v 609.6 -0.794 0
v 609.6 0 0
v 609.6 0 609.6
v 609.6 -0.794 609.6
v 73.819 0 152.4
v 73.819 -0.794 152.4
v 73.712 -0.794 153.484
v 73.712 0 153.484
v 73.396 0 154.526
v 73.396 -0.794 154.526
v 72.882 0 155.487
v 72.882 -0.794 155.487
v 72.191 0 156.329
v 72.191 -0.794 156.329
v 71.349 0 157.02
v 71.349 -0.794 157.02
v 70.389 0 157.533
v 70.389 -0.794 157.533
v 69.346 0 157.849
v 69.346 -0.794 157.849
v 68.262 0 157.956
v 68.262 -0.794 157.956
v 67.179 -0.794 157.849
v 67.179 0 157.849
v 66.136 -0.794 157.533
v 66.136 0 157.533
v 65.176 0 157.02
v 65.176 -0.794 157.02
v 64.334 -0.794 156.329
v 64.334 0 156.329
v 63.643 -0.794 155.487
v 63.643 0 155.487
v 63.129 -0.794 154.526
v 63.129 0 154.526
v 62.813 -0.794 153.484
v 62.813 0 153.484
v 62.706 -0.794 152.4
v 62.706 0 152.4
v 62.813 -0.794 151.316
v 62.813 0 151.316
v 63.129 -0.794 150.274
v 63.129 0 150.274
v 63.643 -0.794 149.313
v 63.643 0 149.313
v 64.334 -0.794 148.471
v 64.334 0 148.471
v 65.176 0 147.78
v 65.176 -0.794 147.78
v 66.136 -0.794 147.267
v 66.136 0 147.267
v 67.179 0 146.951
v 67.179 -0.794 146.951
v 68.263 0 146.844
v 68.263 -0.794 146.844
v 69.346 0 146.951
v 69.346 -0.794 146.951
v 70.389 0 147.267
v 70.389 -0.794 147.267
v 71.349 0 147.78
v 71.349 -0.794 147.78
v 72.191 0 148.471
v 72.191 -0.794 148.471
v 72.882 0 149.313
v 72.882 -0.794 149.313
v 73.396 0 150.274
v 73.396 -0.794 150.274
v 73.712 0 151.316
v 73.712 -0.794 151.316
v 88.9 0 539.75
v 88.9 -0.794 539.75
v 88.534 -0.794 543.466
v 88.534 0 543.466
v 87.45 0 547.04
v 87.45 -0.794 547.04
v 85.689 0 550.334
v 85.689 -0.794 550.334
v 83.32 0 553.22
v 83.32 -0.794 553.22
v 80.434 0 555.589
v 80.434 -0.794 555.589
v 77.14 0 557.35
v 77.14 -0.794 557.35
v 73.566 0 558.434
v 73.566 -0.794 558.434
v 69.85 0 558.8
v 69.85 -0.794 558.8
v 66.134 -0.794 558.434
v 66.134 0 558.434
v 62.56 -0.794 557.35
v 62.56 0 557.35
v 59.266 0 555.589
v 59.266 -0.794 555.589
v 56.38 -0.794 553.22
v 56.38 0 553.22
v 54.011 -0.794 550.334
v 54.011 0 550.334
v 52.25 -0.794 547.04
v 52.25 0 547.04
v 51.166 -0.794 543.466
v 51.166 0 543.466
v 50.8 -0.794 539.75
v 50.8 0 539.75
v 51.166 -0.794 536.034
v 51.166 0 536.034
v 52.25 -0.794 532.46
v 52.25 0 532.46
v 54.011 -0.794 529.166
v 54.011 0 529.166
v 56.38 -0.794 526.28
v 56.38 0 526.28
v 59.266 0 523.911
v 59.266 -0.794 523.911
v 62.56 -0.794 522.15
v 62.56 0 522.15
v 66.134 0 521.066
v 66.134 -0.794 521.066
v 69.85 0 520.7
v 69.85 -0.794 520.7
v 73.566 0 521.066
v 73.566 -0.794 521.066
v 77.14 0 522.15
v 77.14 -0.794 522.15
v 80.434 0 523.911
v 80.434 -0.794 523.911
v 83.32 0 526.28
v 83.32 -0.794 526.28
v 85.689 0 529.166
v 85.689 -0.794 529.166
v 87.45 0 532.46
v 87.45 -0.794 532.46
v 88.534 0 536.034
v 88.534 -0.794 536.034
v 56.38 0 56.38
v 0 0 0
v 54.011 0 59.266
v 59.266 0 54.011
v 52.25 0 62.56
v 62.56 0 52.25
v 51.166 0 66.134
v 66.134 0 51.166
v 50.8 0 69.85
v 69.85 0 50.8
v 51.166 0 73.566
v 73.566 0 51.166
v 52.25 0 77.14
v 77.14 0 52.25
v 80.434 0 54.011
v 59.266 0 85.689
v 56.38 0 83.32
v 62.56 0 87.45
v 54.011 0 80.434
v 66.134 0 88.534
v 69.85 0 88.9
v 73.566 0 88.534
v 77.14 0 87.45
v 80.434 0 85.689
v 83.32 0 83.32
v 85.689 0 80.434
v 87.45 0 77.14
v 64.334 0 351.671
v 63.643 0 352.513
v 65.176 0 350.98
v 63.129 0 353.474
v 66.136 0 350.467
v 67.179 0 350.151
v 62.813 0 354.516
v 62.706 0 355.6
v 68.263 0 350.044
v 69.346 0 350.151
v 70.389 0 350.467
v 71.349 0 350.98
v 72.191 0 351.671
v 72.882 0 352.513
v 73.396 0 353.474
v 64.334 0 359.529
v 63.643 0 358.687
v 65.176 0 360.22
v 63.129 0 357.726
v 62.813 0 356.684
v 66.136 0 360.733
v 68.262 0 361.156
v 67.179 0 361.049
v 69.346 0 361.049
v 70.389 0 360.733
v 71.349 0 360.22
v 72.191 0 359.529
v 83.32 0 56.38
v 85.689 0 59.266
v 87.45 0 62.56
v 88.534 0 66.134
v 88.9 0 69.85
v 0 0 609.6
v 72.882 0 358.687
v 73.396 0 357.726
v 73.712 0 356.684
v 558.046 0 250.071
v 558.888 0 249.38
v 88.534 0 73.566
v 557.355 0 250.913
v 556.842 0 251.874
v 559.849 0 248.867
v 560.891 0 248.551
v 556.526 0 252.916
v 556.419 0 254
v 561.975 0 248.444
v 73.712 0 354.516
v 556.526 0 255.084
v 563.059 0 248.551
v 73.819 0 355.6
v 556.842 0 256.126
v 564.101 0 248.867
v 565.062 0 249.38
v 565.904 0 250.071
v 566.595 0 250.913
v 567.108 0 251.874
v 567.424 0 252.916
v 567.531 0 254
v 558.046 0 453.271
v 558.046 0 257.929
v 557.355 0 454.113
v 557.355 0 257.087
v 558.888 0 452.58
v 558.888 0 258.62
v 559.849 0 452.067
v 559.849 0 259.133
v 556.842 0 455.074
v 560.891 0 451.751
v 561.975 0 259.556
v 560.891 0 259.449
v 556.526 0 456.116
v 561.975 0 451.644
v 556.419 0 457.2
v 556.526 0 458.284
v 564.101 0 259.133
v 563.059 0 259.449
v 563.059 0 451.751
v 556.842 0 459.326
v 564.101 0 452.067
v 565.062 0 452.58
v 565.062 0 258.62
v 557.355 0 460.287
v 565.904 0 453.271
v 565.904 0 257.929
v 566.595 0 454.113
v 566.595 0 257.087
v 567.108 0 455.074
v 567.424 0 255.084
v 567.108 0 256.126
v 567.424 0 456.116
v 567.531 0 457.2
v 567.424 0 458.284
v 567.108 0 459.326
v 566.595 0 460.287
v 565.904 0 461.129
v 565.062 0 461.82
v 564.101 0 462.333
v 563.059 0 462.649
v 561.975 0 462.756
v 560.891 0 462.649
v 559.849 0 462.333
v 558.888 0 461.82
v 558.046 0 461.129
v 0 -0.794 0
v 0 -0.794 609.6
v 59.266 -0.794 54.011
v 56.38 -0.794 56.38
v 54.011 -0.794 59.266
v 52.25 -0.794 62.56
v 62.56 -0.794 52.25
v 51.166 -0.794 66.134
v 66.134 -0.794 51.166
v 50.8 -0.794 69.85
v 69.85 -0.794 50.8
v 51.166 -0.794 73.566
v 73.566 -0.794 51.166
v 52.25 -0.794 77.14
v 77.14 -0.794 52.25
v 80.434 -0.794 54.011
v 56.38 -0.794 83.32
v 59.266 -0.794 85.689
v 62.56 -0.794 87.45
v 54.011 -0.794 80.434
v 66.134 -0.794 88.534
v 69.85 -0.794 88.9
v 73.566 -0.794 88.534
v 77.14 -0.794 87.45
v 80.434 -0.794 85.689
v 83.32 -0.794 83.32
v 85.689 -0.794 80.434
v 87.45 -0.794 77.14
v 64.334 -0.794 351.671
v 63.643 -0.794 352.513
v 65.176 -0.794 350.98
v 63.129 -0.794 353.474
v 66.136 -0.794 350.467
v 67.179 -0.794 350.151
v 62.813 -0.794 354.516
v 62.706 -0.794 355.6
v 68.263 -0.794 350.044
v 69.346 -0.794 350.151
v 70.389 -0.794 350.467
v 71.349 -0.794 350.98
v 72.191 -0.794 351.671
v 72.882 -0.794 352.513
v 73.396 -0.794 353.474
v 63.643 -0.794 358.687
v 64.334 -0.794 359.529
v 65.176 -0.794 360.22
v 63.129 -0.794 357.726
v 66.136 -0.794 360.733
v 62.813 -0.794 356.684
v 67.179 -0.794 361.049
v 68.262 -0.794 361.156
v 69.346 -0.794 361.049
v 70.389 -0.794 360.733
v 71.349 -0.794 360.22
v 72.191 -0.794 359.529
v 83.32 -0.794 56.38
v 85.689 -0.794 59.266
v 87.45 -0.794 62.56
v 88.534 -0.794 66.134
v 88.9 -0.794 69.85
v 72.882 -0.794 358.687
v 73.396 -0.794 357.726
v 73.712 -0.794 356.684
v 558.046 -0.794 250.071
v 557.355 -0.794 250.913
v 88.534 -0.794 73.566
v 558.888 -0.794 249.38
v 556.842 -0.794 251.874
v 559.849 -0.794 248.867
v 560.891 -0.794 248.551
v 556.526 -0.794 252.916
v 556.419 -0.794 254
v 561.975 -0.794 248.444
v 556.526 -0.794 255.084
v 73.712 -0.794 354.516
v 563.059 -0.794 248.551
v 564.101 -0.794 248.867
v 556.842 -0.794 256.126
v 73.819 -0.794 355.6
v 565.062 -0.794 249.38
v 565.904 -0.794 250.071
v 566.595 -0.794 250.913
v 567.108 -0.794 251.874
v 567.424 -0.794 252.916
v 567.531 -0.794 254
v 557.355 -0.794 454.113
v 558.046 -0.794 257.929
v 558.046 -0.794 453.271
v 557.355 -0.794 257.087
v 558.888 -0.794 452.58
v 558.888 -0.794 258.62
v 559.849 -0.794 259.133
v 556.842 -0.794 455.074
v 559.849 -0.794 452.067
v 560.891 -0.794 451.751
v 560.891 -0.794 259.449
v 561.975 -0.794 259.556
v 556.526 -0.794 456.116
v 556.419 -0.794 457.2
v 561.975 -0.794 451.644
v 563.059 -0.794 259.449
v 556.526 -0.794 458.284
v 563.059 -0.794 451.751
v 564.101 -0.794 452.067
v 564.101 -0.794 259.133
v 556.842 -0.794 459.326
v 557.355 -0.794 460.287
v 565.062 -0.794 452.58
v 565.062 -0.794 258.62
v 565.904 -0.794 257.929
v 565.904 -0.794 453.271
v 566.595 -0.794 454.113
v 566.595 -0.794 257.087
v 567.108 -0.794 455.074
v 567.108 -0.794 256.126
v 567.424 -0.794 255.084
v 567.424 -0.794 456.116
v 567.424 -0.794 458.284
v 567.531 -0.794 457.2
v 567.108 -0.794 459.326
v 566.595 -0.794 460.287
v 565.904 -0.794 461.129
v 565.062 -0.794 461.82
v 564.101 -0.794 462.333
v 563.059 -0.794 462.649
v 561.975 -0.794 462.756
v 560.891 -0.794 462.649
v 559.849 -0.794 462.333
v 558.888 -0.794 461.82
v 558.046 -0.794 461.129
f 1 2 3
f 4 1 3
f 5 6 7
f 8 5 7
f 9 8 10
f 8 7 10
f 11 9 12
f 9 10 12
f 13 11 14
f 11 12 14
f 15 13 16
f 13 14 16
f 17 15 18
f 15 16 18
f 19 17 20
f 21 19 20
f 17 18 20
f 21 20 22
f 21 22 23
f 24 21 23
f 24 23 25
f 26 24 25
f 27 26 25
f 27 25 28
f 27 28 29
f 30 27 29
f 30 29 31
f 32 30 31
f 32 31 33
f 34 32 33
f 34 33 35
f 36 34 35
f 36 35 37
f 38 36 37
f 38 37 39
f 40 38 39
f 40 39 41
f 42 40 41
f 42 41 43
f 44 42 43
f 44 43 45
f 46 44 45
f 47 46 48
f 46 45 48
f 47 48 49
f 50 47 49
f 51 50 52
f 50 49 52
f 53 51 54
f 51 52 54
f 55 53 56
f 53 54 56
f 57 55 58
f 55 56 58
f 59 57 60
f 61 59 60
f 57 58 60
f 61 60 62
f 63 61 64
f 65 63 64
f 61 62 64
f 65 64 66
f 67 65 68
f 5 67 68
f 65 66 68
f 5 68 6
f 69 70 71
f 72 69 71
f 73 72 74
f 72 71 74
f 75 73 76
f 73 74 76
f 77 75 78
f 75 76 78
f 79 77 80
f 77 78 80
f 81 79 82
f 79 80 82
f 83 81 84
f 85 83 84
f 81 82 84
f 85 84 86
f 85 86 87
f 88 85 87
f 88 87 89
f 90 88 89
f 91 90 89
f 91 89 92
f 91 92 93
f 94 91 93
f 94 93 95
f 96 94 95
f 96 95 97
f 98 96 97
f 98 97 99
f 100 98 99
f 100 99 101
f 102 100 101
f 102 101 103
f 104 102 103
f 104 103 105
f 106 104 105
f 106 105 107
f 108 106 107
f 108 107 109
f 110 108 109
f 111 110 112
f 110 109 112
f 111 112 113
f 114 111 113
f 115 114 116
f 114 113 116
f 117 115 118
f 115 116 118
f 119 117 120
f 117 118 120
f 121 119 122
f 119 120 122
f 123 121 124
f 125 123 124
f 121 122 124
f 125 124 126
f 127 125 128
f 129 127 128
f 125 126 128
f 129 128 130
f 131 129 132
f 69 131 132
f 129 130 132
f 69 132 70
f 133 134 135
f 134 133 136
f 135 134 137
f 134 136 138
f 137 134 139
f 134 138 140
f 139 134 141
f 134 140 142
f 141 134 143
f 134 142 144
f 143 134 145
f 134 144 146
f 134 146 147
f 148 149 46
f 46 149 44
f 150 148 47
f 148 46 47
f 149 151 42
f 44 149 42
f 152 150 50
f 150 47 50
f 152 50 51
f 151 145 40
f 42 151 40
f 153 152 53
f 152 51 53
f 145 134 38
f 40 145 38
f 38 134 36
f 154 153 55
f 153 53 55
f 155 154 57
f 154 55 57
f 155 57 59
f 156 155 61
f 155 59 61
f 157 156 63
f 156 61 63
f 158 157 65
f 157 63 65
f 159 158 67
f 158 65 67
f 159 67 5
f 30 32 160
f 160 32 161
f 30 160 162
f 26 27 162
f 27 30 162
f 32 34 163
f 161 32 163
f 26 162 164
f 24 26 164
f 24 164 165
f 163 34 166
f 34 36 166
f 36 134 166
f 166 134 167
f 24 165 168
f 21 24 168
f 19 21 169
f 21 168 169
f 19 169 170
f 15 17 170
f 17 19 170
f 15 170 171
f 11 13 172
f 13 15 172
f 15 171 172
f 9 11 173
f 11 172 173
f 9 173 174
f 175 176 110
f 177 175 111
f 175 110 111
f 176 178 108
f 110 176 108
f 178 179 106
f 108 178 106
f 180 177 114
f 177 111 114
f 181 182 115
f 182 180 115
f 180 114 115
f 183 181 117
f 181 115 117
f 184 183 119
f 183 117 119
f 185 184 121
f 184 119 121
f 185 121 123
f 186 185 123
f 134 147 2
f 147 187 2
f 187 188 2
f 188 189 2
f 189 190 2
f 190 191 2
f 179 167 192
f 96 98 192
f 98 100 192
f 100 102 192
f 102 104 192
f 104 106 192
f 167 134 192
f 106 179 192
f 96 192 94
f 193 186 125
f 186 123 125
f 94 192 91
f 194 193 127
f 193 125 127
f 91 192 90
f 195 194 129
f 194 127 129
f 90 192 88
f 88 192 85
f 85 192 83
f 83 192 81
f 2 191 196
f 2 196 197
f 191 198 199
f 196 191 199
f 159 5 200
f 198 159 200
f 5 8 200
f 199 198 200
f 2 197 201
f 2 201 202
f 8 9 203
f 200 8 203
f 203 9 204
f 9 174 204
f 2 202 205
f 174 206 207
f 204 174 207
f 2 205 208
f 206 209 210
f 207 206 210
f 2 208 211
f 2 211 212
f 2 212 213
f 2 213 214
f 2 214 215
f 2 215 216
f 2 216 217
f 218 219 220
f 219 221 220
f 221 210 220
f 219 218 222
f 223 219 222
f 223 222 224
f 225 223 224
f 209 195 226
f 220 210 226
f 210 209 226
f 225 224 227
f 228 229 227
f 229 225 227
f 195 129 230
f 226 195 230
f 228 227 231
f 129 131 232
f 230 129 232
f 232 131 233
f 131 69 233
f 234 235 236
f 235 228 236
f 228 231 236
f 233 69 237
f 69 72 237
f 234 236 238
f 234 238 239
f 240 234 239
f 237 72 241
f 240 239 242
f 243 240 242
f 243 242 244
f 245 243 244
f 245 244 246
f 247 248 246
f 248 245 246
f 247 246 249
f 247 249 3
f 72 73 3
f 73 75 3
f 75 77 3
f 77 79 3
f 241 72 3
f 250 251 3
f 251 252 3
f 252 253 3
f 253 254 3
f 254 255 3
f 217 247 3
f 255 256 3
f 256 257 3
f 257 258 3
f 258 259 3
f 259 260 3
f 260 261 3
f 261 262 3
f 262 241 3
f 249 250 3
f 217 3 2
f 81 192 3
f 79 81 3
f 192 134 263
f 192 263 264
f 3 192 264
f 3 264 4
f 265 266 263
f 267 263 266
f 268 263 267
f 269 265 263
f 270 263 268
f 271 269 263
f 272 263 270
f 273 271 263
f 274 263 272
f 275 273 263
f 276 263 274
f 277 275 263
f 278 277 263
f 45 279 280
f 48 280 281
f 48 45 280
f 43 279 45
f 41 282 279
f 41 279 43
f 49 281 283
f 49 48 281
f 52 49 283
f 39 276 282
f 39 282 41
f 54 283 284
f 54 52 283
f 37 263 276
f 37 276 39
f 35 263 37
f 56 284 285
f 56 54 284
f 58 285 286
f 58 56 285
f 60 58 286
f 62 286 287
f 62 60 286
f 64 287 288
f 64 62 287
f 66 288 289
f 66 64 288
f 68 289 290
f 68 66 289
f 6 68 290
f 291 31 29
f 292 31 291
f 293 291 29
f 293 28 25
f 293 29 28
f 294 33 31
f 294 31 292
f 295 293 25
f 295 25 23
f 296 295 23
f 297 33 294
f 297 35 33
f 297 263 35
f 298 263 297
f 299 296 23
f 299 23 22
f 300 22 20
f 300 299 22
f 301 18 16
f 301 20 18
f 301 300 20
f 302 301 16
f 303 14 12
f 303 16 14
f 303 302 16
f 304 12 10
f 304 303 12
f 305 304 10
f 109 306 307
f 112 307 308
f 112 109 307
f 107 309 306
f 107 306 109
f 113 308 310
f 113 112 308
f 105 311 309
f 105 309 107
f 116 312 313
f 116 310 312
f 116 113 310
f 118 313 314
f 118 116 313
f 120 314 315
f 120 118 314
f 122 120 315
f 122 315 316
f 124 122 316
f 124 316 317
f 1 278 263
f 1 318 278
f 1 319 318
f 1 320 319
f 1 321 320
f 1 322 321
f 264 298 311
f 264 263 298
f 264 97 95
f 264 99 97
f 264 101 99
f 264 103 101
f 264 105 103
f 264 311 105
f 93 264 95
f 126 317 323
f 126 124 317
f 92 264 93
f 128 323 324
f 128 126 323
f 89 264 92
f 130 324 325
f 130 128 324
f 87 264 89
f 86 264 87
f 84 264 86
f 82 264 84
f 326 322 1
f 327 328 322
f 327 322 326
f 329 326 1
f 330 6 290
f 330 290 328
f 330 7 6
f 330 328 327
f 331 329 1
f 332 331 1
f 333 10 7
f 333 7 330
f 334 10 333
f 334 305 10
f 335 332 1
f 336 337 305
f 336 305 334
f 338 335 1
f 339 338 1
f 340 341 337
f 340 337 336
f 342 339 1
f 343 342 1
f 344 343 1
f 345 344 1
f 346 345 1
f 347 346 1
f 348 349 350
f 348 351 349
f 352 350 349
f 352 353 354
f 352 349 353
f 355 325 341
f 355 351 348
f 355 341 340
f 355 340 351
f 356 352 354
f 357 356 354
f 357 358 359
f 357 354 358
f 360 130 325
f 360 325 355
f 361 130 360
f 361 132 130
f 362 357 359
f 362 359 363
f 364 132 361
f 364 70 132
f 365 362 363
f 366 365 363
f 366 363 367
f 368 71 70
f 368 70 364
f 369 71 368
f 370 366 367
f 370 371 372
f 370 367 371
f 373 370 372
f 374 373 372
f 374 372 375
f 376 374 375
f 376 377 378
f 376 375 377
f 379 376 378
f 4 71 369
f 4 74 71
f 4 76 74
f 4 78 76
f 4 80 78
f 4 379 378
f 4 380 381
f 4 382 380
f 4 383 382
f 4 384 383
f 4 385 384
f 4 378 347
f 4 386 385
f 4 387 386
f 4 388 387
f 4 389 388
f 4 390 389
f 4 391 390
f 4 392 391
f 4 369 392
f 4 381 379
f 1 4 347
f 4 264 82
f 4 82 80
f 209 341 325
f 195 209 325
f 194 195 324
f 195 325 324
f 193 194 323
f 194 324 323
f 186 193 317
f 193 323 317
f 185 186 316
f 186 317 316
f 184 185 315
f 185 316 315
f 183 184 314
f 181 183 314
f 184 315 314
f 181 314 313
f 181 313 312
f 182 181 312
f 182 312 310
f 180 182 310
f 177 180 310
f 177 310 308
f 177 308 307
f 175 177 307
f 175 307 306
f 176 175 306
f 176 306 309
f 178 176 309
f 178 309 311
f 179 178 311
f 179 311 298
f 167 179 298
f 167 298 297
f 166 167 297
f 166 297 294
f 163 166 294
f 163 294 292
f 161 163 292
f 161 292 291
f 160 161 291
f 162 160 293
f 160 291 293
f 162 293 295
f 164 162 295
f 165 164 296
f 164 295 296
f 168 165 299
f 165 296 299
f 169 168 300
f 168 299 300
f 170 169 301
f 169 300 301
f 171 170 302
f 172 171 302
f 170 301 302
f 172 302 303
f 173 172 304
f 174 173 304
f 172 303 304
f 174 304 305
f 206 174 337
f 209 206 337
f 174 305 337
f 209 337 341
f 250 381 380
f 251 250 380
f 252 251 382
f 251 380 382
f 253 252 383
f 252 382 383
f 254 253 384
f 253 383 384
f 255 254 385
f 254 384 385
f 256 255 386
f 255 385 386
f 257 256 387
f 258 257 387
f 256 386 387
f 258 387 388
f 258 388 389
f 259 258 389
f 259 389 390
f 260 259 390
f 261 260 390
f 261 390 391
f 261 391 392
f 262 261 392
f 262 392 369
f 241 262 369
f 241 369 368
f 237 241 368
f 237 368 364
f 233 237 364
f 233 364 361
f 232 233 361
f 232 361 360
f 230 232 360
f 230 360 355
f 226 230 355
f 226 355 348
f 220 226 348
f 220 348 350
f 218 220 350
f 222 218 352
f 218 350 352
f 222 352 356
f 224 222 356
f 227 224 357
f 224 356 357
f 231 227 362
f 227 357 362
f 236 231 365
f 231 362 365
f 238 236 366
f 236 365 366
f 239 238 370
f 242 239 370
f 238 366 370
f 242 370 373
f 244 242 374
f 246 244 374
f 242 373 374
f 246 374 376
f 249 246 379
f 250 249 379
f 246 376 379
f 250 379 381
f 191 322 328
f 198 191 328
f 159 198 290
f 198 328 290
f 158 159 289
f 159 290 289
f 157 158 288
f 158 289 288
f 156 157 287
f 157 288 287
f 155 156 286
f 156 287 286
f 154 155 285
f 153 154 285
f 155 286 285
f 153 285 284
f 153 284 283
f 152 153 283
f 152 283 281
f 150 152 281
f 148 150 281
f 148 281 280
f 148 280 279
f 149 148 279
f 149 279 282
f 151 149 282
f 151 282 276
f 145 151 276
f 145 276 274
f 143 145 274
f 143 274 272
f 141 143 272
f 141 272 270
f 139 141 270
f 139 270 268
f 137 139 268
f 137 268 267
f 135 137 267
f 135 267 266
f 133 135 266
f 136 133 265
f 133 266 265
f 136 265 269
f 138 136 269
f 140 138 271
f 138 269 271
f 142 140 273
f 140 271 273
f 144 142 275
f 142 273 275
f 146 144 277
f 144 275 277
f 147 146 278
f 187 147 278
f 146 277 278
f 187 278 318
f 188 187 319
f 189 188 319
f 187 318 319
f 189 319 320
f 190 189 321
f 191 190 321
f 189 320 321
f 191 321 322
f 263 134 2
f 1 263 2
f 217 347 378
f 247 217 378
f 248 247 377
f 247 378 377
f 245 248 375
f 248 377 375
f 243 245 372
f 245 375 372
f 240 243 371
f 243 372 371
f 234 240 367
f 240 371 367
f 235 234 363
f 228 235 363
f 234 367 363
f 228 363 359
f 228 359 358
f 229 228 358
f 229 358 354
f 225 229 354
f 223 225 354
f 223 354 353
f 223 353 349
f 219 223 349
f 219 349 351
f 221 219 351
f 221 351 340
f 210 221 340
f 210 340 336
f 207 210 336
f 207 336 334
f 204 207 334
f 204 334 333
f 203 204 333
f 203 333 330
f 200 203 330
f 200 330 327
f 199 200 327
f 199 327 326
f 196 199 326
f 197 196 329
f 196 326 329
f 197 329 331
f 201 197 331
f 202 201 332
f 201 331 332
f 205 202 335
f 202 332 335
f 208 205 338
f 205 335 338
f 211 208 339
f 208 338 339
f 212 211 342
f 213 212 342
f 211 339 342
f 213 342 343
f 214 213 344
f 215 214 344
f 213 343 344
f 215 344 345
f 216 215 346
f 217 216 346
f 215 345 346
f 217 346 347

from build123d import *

# Parameters (mm, degrees)
F0_W     = 609.6
F0_H     = 609.6
F1_DEPTH = 0.79375
F2_R     = 5.55625
F3_DEPTH = 25.4
F4_R     = 19.05
F5_DEPTH = 25.4


# Not quite as in the source:
# - a feature names something its author has since deleted; it is built from what else it names


with BuildPart() as f1:
    # F0 (on Front) → F1 (new body)
    with BuildSketch(Plane.XZ):
        with Locations((304.8, 304.8)):
            Rectangle(F0_W, F0_H)
    extrude(amount=F1_DEPTH)

    # F2 (on face) → F3 (cut)
    with BuildSketch(Plane.XZ.offset(0.79375)):
        with Locations((68.2625, 355.6)):
            Circle(F2_R)
        with Locations((68.2625, 152.4)):
            Circle(F2_R)
        with Locations((561.975, 254)):
            Circle(F2_R)
        with Locations((561.975, 457.2)):
            Circle(F2_R)
    extrude(amount=-F3_DEPTH, mode=Mode.SUBTRACT)

    # F4 (on face) → F5 (cut)
    with BuildSketch(Plane.XZ.offset(0.79375)):
        with Locations((69.85, 69.85)):
            Circle(F4_R)
        with Locations((69.85, 539.75)):
            Circle(F4_R)
    extrude(amount=-F5_DEPTH, mode=Mode.SUBTRACT)


solid = f1.part
